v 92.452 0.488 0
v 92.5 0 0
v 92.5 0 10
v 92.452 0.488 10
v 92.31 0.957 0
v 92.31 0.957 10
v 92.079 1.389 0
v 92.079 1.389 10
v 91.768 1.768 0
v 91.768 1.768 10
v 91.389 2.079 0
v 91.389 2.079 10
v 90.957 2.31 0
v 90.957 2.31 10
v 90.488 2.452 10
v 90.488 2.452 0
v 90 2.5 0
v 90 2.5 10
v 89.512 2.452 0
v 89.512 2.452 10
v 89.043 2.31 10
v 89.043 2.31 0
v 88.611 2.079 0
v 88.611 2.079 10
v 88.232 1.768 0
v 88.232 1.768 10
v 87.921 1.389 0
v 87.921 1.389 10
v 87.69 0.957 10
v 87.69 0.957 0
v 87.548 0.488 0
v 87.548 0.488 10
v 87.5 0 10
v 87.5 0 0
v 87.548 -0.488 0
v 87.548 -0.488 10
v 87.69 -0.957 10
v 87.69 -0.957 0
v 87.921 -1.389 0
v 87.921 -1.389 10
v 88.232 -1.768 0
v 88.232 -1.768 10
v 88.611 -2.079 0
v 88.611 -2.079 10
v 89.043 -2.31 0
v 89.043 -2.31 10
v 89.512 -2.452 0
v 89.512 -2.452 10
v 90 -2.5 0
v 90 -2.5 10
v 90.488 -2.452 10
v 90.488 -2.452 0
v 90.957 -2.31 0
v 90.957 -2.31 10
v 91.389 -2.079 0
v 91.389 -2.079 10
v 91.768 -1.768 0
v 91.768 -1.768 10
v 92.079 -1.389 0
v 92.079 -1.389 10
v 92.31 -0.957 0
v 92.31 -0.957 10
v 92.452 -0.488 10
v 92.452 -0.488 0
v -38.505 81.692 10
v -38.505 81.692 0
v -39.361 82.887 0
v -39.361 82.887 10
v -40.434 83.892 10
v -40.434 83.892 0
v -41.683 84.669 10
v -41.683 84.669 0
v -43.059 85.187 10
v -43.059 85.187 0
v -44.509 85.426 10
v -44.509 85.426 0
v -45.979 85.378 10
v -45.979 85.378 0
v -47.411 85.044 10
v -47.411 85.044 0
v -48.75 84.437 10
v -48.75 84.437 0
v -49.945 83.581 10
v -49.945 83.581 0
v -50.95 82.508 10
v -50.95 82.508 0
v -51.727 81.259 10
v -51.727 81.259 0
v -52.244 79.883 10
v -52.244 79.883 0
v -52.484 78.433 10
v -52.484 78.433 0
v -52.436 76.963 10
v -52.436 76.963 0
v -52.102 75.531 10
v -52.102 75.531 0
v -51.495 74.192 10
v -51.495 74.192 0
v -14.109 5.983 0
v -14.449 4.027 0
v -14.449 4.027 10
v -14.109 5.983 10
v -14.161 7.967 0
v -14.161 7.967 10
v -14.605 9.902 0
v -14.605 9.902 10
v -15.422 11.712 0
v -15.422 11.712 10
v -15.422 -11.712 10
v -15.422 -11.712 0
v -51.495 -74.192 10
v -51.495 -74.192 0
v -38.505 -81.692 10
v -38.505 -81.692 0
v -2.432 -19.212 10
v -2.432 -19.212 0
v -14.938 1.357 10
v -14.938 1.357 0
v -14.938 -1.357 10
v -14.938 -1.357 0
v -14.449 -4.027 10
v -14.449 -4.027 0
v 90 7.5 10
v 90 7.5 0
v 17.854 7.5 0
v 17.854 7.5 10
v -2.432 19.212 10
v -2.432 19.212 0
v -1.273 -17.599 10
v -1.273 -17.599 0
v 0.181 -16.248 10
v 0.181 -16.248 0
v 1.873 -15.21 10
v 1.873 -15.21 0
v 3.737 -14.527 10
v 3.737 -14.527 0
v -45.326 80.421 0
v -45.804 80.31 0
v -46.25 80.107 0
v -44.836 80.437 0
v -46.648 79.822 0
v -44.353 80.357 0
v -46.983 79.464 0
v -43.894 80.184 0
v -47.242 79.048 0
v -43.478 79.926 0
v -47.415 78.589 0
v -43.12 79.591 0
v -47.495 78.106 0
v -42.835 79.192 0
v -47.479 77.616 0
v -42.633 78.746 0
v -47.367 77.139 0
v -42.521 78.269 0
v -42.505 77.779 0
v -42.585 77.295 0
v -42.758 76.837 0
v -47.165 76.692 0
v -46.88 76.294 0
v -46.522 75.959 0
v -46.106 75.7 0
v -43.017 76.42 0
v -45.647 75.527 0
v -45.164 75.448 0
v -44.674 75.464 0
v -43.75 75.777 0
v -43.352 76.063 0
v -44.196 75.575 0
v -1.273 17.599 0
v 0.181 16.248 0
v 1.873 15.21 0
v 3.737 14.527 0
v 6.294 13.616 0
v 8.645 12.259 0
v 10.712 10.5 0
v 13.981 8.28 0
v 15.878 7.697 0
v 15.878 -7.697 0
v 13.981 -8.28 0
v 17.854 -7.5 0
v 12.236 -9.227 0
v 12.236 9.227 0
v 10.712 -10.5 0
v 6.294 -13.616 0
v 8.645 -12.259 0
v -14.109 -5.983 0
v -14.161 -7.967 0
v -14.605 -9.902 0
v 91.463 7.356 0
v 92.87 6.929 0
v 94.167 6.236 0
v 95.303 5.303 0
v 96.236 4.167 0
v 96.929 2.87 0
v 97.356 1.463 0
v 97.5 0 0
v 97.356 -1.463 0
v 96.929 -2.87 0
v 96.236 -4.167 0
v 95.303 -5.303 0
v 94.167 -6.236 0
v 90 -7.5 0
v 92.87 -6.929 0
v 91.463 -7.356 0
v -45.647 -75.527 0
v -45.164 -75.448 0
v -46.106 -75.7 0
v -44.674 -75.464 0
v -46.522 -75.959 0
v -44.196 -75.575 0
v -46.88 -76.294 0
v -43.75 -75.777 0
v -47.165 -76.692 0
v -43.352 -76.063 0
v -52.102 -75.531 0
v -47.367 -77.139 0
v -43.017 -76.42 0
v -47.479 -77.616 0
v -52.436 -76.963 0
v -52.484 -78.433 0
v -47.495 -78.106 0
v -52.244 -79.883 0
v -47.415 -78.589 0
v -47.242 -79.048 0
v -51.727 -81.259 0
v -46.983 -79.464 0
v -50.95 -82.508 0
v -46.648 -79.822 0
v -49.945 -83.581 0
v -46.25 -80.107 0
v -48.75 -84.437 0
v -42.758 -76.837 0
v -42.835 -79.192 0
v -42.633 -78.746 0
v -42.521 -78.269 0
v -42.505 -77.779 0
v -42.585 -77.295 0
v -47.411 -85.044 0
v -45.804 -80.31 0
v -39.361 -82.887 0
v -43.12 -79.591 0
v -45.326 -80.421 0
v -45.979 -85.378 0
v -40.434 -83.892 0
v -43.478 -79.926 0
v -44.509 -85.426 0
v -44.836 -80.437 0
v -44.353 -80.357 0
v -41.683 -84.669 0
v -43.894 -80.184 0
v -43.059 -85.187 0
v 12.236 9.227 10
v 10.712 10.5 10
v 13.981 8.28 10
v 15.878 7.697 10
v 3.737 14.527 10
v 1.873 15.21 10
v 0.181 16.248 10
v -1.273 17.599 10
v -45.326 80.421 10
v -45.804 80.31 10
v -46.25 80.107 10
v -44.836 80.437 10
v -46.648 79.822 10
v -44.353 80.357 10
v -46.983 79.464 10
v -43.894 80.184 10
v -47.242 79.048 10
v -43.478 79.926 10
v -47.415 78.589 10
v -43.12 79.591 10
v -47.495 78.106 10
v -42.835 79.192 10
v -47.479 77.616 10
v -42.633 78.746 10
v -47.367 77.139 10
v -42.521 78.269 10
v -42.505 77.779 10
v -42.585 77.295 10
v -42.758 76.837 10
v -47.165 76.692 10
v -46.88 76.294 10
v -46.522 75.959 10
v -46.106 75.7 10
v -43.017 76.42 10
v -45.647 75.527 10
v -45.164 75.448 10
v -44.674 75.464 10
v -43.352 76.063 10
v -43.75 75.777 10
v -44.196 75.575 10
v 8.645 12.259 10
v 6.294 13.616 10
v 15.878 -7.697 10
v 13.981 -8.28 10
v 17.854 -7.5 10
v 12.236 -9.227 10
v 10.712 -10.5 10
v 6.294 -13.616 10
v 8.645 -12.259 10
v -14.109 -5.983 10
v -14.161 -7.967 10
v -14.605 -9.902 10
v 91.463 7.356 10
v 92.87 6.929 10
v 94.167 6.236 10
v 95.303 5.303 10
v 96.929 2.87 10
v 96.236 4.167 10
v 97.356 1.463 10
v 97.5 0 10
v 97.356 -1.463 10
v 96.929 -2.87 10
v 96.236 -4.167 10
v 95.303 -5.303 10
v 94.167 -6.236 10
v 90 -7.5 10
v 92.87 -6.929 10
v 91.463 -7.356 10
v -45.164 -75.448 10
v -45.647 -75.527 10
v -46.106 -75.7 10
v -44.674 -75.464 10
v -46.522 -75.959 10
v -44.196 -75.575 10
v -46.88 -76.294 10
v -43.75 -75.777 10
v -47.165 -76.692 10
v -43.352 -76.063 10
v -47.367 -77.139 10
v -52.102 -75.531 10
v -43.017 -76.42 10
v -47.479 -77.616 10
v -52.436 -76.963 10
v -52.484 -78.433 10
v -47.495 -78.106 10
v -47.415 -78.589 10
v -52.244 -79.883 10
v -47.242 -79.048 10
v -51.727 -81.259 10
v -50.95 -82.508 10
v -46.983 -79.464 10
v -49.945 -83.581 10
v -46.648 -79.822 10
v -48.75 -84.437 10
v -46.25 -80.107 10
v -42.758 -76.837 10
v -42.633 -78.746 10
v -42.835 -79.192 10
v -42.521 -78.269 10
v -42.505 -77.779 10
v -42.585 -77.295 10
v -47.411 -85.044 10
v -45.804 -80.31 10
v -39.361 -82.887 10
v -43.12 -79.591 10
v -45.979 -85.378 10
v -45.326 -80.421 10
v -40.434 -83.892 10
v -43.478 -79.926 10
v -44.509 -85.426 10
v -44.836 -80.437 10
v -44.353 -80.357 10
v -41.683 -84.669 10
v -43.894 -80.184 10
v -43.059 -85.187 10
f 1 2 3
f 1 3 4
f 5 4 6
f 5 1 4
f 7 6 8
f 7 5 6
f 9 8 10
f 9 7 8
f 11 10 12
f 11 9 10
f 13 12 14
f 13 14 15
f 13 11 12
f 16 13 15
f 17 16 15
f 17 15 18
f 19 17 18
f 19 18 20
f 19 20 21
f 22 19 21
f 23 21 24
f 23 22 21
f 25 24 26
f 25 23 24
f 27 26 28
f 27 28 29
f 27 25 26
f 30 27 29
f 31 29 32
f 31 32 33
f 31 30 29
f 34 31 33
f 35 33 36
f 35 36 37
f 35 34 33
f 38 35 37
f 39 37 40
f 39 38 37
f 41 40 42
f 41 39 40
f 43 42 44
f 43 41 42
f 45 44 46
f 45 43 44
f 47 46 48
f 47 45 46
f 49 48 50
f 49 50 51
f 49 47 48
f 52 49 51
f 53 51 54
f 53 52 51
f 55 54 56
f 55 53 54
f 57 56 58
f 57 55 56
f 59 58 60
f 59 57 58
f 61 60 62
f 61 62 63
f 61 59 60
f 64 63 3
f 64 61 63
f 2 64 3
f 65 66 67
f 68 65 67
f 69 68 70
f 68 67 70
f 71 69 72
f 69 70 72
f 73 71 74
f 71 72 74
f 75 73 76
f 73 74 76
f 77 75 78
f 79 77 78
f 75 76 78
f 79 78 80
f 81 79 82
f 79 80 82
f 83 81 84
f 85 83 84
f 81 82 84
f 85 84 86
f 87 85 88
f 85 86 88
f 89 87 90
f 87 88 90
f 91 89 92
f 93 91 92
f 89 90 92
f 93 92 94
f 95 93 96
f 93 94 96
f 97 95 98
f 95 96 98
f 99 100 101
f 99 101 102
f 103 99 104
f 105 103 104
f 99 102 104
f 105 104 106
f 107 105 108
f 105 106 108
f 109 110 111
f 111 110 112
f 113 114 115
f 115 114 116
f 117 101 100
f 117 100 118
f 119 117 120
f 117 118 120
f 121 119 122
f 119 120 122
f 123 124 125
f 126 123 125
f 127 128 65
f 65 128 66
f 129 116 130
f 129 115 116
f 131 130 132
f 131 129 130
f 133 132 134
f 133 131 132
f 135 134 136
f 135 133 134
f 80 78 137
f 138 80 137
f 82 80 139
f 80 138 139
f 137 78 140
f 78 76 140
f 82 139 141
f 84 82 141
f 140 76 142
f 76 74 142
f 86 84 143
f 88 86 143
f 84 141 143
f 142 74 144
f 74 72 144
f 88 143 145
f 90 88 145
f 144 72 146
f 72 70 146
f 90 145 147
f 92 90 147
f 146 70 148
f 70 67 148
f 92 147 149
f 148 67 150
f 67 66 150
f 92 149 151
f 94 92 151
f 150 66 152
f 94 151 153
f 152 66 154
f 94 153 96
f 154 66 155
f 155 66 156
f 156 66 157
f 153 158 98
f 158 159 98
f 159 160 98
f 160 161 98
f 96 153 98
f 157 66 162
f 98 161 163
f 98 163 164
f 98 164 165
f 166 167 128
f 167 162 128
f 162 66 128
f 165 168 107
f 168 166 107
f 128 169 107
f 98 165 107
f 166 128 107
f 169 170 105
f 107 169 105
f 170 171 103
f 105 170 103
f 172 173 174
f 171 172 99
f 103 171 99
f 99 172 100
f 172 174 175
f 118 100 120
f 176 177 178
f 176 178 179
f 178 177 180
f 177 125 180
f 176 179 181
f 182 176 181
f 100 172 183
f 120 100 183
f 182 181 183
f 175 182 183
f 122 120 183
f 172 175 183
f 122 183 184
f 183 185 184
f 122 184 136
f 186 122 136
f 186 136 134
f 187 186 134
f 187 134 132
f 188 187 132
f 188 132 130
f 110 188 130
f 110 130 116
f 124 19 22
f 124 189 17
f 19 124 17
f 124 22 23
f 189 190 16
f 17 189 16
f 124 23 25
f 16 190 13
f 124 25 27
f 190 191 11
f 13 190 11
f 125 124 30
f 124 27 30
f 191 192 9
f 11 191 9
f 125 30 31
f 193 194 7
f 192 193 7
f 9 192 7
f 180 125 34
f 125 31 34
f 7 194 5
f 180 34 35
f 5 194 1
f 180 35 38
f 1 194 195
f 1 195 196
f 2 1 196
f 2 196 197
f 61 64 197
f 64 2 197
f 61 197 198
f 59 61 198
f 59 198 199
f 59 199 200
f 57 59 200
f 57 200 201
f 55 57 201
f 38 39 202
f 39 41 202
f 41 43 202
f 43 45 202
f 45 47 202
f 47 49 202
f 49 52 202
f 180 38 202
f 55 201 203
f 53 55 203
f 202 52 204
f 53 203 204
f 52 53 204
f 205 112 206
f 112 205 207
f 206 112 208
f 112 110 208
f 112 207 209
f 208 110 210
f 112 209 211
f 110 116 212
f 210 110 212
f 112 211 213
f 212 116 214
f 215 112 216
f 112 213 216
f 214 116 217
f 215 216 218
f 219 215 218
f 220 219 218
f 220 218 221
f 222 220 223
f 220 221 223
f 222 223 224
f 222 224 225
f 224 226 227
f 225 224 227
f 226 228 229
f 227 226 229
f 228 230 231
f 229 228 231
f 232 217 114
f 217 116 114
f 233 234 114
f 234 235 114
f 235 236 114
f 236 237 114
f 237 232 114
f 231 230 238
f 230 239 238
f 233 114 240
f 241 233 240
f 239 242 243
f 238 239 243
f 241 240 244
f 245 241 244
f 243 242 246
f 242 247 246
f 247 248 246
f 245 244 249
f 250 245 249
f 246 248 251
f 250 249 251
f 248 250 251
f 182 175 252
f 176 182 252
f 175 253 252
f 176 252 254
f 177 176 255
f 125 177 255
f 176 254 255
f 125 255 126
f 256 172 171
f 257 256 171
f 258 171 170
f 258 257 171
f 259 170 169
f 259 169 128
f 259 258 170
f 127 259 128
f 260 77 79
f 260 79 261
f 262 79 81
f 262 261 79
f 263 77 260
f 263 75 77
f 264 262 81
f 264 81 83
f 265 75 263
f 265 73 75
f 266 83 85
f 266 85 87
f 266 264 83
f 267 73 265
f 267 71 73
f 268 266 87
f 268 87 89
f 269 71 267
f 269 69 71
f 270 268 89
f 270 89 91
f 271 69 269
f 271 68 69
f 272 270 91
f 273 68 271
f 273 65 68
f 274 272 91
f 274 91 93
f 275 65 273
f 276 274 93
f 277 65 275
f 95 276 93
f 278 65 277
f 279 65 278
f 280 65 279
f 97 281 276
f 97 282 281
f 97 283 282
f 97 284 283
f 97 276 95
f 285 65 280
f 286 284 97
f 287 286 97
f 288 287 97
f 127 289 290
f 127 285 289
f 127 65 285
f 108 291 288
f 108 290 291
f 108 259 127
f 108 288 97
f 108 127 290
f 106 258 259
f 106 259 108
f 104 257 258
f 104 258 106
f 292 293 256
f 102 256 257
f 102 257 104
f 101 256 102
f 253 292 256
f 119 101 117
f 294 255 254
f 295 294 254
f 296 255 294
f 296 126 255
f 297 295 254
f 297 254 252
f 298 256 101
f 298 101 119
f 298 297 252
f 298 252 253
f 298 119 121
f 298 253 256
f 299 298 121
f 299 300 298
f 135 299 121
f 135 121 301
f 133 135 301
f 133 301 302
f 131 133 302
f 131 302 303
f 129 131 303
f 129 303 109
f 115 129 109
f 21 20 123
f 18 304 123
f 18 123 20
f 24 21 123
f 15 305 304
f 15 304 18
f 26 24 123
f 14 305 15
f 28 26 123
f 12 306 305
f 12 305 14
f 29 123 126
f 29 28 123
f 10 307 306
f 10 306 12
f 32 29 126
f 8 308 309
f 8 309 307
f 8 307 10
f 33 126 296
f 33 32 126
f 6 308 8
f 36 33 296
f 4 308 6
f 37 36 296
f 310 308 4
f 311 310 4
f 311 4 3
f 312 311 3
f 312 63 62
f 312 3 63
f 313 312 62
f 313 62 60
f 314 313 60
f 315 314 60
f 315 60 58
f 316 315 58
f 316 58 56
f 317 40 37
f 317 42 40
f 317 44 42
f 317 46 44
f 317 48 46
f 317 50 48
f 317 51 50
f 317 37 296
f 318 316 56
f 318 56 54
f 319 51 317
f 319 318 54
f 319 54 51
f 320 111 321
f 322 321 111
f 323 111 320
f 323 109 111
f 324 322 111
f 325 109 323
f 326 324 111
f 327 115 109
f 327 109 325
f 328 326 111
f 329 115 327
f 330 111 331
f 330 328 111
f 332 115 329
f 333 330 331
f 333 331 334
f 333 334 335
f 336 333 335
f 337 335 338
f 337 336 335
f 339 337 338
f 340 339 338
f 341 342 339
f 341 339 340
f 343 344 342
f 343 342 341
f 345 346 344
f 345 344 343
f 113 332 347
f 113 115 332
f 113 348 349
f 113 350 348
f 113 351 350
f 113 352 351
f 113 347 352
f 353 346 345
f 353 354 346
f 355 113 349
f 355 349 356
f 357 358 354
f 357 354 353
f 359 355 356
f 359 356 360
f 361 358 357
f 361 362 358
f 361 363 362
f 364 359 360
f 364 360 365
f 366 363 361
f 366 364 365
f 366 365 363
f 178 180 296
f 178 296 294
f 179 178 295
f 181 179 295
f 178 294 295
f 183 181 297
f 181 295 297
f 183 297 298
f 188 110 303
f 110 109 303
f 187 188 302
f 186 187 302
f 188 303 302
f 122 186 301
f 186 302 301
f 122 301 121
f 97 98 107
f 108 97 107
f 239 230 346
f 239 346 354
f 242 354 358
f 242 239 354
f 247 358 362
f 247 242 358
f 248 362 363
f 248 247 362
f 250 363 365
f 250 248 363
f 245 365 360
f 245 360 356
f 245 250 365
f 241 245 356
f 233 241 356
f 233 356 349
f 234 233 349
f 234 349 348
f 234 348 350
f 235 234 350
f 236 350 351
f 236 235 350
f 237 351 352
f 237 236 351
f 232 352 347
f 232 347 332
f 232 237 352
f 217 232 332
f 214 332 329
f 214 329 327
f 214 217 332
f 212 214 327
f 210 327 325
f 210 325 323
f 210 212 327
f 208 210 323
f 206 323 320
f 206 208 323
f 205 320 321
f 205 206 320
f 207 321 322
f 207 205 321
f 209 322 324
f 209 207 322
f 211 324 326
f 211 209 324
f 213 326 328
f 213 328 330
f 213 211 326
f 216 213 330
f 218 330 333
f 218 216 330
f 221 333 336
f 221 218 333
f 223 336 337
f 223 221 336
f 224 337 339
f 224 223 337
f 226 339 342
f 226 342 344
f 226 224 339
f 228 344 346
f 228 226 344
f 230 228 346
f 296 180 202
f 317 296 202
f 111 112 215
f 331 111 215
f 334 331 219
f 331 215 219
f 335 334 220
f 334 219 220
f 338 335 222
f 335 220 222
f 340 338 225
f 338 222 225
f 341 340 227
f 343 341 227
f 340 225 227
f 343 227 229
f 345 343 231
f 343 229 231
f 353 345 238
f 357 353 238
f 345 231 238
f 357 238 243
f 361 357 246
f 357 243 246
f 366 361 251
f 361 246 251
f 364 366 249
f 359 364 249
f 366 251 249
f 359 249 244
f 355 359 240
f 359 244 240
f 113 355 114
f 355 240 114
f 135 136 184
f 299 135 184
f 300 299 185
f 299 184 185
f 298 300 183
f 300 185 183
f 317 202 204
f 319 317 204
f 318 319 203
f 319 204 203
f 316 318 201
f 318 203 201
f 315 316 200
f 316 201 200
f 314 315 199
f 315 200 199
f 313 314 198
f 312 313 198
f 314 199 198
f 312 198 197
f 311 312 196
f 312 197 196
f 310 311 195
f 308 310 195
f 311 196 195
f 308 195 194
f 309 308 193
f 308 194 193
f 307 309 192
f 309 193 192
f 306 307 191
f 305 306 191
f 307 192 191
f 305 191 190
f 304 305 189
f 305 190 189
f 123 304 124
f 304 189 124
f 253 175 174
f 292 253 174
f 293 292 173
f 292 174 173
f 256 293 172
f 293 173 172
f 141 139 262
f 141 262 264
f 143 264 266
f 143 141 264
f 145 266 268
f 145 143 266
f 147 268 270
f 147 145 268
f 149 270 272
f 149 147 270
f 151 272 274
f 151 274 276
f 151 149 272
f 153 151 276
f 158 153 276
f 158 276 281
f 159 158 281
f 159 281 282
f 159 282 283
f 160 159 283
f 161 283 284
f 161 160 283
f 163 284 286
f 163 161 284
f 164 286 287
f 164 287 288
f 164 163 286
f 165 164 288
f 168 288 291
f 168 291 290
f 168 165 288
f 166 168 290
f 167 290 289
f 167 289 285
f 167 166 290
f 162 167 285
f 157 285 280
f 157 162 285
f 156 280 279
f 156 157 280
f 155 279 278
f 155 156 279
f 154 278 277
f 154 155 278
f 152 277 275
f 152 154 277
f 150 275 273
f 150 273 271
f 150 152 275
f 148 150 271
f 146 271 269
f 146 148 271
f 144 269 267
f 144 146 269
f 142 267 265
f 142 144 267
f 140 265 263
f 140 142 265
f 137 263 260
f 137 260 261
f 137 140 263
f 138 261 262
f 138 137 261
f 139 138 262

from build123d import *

# Parameters (mm, degrees)
SKETCH1_R                = 2.5
BOSS_EXTRUDE1_DEPTH      = 10
FILLET1_R                = 10
CIRPATTERN2_COUNT        = 3
FILLET1_OF_CIRPATTERN2_R = 10


with BuildPart() as part:
    # Sketch1 → Boss-Extrude1 (new body)
    with BuildSketch(Plane.XY):
        with BuildLine():
            Line((12.990381057, -7.5), (90, -7.5))
            ThreePointArc((90, -7.5), (97.5, 0), (90, 7.5))
            Line((90, 7.5), (12.990381057, 7.5))
            ThreePointArc((12.990381057, 7.5), (-15, 0), (12.990381057, -7.5))
        make_face()
        with Locations((90, 0)):
            Circle(SKETCH1_R, mode=Mode.SUBTRACT)
    boss_extrude1 = extrude(amount=BOSS_EXTRUDE1_DEPTH)

    # Fillet1
    fillet1_edges = [part.edges().sort_by_distance(p)[0] for p in [
        (12.990381057, -7.5, 5),
        (12.990381057, 7.5, 5),
    ]]
    fillet(fillet1_edges, radius=FILLET1_R)

    # CirPattern2: Boss-Extrude1 ×3 about axis
    cirpattern2_axis = Axis((0, 0, 0), (0, 0, 1))
    for i in range(1, CIRPATTERN2_COUNT):
        add(boss_extrude1.rotate(cirpattern2_axis, i * 360 / CIRPATTERN2_COUNT))

    # Fillet1 of CirPattern2
    fillet1_of_cirpattern2_edges = [part.edges().sort_by_distance(p)[0] for p in [
        (0, 15, 5),
        (-12.990381057, 7.5, 5),
        (-12.990381057, -7.5, 5),
        (0, -15, 5),
    ]]
    fillet(fillet1_of_cirpattern2_edges, radius=FILLET1_OF_CIRPATTERN2_R)


solid = part.part
